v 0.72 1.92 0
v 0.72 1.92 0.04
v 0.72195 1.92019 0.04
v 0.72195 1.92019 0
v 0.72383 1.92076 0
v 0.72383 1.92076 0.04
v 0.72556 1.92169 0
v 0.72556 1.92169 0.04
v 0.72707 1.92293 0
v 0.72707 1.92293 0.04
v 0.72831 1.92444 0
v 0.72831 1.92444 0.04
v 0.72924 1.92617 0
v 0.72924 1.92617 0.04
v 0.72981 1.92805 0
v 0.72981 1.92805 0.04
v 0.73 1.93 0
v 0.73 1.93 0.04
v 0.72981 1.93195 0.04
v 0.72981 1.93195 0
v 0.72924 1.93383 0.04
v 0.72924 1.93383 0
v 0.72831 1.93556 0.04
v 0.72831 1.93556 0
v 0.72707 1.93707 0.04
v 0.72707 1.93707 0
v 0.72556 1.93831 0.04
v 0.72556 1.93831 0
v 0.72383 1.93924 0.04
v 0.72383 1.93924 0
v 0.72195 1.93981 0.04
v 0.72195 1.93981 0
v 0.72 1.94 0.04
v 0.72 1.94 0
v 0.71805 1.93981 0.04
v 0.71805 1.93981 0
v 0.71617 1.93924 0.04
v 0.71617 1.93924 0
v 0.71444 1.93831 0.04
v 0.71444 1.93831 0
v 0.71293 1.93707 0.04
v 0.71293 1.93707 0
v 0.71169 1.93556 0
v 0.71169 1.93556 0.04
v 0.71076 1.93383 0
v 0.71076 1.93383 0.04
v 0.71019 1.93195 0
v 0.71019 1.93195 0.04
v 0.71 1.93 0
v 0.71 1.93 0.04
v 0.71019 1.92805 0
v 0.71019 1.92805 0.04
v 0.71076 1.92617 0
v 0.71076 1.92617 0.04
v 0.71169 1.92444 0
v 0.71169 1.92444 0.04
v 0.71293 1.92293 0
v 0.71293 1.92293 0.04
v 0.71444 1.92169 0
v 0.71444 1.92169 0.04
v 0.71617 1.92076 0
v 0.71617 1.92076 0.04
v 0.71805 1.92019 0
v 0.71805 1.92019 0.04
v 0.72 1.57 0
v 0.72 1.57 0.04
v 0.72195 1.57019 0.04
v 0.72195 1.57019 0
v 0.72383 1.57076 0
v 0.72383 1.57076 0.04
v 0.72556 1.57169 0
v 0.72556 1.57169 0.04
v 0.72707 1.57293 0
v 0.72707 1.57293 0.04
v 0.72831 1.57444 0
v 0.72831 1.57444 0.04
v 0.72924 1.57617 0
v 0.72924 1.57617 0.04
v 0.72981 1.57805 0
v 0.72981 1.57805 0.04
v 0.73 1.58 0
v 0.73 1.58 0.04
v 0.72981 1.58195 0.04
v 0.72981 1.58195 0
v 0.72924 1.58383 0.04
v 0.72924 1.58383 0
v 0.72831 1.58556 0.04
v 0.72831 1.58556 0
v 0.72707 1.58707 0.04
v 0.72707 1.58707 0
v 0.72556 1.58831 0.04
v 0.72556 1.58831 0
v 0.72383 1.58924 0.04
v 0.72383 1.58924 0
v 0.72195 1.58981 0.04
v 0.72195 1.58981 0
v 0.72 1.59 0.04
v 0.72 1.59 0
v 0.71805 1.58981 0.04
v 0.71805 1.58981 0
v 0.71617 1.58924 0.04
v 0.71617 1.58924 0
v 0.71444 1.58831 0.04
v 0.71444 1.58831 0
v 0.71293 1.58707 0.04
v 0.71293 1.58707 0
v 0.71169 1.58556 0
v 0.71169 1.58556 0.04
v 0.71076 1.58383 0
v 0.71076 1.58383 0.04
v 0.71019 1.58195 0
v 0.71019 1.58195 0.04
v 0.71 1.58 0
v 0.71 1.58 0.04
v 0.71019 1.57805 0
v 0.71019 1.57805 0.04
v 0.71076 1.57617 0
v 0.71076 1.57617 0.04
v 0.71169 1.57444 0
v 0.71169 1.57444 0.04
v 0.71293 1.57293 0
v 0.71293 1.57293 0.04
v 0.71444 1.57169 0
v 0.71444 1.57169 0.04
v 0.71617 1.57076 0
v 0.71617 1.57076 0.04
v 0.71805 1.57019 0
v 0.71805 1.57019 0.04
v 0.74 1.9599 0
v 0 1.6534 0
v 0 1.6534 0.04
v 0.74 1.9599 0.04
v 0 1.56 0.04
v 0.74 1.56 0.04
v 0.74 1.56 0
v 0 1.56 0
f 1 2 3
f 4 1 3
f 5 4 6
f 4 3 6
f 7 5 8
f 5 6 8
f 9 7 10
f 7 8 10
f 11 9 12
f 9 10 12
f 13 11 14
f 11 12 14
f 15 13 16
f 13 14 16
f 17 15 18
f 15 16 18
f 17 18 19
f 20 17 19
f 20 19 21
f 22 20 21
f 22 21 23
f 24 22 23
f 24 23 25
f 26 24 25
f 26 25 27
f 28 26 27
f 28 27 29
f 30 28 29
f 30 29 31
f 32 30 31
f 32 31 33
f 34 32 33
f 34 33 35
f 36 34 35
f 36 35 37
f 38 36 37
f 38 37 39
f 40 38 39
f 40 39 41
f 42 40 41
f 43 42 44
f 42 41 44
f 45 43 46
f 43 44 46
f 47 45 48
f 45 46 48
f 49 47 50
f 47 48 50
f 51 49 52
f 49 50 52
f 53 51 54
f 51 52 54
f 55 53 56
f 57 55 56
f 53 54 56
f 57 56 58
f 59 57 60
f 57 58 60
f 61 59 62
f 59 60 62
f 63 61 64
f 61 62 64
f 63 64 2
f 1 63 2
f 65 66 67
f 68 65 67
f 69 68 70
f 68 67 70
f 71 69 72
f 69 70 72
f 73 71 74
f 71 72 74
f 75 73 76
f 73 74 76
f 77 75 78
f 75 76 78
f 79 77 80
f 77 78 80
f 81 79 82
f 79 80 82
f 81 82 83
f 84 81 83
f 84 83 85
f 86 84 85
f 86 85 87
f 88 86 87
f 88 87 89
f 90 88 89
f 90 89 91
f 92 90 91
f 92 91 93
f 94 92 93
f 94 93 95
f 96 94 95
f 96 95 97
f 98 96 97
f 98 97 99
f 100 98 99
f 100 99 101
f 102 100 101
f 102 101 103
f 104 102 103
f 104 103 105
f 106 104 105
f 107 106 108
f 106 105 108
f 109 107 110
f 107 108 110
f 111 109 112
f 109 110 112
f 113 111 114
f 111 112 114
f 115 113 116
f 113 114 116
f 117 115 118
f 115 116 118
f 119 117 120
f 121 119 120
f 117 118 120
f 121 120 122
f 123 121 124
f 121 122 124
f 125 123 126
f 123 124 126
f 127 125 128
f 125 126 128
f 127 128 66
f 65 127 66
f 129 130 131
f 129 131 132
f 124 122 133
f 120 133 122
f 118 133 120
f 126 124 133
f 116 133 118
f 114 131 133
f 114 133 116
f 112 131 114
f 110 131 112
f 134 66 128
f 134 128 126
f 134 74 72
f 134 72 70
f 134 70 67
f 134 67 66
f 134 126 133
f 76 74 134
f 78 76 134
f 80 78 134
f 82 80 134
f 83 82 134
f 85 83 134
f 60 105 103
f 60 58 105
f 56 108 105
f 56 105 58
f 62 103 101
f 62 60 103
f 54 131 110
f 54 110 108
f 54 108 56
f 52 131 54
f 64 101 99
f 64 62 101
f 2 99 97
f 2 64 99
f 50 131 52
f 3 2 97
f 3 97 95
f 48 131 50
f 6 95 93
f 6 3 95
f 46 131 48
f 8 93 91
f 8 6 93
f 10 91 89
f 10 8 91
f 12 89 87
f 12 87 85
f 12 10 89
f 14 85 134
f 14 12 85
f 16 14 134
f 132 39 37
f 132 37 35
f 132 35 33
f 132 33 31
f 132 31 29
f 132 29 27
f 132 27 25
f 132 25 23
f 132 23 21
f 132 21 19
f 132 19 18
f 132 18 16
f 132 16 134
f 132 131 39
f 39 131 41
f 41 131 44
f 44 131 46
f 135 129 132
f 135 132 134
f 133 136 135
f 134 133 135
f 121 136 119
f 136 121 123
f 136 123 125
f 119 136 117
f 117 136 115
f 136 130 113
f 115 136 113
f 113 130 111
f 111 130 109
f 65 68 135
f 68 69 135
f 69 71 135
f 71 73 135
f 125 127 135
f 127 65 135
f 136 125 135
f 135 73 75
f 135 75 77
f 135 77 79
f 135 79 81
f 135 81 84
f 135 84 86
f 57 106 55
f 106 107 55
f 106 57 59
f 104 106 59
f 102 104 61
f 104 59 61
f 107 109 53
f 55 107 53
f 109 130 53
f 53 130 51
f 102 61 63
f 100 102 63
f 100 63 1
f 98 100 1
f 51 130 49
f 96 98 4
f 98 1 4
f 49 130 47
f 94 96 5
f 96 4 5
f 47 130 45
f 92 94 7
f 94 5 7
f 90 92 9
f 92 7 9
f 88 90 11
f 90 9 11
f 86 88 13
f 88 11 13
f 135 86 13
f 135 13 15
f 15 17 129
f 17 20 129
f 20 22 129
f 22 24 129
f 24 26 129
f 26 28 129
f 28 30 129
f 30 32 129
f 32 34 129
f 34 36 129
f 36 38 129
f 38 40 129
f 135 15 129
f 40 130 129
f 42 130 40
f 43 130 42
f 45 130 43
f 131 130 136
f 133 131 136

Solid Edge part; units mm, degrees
sketch "Sketch1" plane through (0, 0, 0) normal (0, 0, 1) x (1, 0, 0)
  line L0 (0, 1.56) -> (0.74, 1.56)
  line L1 (0.74, 1.9599) -> (0.74, 1.56)
  line L2 (0, 1.6534) -> (0.74, 1.9599)
  line L3 (0, 1.6534) -> (0, 1.56)
extrude "Protrusion1" add sketch "Sketch1" along normal blind 0.04
hole "Bohrung_1" at (0.72, 1.58, 0.04) direction (0, 0, -1) diameter 0.02 end through all
hole "Hole1" at (0.72, 1.93, 0.04) direction (0, 0, -1) diameter 0.02 end through all
